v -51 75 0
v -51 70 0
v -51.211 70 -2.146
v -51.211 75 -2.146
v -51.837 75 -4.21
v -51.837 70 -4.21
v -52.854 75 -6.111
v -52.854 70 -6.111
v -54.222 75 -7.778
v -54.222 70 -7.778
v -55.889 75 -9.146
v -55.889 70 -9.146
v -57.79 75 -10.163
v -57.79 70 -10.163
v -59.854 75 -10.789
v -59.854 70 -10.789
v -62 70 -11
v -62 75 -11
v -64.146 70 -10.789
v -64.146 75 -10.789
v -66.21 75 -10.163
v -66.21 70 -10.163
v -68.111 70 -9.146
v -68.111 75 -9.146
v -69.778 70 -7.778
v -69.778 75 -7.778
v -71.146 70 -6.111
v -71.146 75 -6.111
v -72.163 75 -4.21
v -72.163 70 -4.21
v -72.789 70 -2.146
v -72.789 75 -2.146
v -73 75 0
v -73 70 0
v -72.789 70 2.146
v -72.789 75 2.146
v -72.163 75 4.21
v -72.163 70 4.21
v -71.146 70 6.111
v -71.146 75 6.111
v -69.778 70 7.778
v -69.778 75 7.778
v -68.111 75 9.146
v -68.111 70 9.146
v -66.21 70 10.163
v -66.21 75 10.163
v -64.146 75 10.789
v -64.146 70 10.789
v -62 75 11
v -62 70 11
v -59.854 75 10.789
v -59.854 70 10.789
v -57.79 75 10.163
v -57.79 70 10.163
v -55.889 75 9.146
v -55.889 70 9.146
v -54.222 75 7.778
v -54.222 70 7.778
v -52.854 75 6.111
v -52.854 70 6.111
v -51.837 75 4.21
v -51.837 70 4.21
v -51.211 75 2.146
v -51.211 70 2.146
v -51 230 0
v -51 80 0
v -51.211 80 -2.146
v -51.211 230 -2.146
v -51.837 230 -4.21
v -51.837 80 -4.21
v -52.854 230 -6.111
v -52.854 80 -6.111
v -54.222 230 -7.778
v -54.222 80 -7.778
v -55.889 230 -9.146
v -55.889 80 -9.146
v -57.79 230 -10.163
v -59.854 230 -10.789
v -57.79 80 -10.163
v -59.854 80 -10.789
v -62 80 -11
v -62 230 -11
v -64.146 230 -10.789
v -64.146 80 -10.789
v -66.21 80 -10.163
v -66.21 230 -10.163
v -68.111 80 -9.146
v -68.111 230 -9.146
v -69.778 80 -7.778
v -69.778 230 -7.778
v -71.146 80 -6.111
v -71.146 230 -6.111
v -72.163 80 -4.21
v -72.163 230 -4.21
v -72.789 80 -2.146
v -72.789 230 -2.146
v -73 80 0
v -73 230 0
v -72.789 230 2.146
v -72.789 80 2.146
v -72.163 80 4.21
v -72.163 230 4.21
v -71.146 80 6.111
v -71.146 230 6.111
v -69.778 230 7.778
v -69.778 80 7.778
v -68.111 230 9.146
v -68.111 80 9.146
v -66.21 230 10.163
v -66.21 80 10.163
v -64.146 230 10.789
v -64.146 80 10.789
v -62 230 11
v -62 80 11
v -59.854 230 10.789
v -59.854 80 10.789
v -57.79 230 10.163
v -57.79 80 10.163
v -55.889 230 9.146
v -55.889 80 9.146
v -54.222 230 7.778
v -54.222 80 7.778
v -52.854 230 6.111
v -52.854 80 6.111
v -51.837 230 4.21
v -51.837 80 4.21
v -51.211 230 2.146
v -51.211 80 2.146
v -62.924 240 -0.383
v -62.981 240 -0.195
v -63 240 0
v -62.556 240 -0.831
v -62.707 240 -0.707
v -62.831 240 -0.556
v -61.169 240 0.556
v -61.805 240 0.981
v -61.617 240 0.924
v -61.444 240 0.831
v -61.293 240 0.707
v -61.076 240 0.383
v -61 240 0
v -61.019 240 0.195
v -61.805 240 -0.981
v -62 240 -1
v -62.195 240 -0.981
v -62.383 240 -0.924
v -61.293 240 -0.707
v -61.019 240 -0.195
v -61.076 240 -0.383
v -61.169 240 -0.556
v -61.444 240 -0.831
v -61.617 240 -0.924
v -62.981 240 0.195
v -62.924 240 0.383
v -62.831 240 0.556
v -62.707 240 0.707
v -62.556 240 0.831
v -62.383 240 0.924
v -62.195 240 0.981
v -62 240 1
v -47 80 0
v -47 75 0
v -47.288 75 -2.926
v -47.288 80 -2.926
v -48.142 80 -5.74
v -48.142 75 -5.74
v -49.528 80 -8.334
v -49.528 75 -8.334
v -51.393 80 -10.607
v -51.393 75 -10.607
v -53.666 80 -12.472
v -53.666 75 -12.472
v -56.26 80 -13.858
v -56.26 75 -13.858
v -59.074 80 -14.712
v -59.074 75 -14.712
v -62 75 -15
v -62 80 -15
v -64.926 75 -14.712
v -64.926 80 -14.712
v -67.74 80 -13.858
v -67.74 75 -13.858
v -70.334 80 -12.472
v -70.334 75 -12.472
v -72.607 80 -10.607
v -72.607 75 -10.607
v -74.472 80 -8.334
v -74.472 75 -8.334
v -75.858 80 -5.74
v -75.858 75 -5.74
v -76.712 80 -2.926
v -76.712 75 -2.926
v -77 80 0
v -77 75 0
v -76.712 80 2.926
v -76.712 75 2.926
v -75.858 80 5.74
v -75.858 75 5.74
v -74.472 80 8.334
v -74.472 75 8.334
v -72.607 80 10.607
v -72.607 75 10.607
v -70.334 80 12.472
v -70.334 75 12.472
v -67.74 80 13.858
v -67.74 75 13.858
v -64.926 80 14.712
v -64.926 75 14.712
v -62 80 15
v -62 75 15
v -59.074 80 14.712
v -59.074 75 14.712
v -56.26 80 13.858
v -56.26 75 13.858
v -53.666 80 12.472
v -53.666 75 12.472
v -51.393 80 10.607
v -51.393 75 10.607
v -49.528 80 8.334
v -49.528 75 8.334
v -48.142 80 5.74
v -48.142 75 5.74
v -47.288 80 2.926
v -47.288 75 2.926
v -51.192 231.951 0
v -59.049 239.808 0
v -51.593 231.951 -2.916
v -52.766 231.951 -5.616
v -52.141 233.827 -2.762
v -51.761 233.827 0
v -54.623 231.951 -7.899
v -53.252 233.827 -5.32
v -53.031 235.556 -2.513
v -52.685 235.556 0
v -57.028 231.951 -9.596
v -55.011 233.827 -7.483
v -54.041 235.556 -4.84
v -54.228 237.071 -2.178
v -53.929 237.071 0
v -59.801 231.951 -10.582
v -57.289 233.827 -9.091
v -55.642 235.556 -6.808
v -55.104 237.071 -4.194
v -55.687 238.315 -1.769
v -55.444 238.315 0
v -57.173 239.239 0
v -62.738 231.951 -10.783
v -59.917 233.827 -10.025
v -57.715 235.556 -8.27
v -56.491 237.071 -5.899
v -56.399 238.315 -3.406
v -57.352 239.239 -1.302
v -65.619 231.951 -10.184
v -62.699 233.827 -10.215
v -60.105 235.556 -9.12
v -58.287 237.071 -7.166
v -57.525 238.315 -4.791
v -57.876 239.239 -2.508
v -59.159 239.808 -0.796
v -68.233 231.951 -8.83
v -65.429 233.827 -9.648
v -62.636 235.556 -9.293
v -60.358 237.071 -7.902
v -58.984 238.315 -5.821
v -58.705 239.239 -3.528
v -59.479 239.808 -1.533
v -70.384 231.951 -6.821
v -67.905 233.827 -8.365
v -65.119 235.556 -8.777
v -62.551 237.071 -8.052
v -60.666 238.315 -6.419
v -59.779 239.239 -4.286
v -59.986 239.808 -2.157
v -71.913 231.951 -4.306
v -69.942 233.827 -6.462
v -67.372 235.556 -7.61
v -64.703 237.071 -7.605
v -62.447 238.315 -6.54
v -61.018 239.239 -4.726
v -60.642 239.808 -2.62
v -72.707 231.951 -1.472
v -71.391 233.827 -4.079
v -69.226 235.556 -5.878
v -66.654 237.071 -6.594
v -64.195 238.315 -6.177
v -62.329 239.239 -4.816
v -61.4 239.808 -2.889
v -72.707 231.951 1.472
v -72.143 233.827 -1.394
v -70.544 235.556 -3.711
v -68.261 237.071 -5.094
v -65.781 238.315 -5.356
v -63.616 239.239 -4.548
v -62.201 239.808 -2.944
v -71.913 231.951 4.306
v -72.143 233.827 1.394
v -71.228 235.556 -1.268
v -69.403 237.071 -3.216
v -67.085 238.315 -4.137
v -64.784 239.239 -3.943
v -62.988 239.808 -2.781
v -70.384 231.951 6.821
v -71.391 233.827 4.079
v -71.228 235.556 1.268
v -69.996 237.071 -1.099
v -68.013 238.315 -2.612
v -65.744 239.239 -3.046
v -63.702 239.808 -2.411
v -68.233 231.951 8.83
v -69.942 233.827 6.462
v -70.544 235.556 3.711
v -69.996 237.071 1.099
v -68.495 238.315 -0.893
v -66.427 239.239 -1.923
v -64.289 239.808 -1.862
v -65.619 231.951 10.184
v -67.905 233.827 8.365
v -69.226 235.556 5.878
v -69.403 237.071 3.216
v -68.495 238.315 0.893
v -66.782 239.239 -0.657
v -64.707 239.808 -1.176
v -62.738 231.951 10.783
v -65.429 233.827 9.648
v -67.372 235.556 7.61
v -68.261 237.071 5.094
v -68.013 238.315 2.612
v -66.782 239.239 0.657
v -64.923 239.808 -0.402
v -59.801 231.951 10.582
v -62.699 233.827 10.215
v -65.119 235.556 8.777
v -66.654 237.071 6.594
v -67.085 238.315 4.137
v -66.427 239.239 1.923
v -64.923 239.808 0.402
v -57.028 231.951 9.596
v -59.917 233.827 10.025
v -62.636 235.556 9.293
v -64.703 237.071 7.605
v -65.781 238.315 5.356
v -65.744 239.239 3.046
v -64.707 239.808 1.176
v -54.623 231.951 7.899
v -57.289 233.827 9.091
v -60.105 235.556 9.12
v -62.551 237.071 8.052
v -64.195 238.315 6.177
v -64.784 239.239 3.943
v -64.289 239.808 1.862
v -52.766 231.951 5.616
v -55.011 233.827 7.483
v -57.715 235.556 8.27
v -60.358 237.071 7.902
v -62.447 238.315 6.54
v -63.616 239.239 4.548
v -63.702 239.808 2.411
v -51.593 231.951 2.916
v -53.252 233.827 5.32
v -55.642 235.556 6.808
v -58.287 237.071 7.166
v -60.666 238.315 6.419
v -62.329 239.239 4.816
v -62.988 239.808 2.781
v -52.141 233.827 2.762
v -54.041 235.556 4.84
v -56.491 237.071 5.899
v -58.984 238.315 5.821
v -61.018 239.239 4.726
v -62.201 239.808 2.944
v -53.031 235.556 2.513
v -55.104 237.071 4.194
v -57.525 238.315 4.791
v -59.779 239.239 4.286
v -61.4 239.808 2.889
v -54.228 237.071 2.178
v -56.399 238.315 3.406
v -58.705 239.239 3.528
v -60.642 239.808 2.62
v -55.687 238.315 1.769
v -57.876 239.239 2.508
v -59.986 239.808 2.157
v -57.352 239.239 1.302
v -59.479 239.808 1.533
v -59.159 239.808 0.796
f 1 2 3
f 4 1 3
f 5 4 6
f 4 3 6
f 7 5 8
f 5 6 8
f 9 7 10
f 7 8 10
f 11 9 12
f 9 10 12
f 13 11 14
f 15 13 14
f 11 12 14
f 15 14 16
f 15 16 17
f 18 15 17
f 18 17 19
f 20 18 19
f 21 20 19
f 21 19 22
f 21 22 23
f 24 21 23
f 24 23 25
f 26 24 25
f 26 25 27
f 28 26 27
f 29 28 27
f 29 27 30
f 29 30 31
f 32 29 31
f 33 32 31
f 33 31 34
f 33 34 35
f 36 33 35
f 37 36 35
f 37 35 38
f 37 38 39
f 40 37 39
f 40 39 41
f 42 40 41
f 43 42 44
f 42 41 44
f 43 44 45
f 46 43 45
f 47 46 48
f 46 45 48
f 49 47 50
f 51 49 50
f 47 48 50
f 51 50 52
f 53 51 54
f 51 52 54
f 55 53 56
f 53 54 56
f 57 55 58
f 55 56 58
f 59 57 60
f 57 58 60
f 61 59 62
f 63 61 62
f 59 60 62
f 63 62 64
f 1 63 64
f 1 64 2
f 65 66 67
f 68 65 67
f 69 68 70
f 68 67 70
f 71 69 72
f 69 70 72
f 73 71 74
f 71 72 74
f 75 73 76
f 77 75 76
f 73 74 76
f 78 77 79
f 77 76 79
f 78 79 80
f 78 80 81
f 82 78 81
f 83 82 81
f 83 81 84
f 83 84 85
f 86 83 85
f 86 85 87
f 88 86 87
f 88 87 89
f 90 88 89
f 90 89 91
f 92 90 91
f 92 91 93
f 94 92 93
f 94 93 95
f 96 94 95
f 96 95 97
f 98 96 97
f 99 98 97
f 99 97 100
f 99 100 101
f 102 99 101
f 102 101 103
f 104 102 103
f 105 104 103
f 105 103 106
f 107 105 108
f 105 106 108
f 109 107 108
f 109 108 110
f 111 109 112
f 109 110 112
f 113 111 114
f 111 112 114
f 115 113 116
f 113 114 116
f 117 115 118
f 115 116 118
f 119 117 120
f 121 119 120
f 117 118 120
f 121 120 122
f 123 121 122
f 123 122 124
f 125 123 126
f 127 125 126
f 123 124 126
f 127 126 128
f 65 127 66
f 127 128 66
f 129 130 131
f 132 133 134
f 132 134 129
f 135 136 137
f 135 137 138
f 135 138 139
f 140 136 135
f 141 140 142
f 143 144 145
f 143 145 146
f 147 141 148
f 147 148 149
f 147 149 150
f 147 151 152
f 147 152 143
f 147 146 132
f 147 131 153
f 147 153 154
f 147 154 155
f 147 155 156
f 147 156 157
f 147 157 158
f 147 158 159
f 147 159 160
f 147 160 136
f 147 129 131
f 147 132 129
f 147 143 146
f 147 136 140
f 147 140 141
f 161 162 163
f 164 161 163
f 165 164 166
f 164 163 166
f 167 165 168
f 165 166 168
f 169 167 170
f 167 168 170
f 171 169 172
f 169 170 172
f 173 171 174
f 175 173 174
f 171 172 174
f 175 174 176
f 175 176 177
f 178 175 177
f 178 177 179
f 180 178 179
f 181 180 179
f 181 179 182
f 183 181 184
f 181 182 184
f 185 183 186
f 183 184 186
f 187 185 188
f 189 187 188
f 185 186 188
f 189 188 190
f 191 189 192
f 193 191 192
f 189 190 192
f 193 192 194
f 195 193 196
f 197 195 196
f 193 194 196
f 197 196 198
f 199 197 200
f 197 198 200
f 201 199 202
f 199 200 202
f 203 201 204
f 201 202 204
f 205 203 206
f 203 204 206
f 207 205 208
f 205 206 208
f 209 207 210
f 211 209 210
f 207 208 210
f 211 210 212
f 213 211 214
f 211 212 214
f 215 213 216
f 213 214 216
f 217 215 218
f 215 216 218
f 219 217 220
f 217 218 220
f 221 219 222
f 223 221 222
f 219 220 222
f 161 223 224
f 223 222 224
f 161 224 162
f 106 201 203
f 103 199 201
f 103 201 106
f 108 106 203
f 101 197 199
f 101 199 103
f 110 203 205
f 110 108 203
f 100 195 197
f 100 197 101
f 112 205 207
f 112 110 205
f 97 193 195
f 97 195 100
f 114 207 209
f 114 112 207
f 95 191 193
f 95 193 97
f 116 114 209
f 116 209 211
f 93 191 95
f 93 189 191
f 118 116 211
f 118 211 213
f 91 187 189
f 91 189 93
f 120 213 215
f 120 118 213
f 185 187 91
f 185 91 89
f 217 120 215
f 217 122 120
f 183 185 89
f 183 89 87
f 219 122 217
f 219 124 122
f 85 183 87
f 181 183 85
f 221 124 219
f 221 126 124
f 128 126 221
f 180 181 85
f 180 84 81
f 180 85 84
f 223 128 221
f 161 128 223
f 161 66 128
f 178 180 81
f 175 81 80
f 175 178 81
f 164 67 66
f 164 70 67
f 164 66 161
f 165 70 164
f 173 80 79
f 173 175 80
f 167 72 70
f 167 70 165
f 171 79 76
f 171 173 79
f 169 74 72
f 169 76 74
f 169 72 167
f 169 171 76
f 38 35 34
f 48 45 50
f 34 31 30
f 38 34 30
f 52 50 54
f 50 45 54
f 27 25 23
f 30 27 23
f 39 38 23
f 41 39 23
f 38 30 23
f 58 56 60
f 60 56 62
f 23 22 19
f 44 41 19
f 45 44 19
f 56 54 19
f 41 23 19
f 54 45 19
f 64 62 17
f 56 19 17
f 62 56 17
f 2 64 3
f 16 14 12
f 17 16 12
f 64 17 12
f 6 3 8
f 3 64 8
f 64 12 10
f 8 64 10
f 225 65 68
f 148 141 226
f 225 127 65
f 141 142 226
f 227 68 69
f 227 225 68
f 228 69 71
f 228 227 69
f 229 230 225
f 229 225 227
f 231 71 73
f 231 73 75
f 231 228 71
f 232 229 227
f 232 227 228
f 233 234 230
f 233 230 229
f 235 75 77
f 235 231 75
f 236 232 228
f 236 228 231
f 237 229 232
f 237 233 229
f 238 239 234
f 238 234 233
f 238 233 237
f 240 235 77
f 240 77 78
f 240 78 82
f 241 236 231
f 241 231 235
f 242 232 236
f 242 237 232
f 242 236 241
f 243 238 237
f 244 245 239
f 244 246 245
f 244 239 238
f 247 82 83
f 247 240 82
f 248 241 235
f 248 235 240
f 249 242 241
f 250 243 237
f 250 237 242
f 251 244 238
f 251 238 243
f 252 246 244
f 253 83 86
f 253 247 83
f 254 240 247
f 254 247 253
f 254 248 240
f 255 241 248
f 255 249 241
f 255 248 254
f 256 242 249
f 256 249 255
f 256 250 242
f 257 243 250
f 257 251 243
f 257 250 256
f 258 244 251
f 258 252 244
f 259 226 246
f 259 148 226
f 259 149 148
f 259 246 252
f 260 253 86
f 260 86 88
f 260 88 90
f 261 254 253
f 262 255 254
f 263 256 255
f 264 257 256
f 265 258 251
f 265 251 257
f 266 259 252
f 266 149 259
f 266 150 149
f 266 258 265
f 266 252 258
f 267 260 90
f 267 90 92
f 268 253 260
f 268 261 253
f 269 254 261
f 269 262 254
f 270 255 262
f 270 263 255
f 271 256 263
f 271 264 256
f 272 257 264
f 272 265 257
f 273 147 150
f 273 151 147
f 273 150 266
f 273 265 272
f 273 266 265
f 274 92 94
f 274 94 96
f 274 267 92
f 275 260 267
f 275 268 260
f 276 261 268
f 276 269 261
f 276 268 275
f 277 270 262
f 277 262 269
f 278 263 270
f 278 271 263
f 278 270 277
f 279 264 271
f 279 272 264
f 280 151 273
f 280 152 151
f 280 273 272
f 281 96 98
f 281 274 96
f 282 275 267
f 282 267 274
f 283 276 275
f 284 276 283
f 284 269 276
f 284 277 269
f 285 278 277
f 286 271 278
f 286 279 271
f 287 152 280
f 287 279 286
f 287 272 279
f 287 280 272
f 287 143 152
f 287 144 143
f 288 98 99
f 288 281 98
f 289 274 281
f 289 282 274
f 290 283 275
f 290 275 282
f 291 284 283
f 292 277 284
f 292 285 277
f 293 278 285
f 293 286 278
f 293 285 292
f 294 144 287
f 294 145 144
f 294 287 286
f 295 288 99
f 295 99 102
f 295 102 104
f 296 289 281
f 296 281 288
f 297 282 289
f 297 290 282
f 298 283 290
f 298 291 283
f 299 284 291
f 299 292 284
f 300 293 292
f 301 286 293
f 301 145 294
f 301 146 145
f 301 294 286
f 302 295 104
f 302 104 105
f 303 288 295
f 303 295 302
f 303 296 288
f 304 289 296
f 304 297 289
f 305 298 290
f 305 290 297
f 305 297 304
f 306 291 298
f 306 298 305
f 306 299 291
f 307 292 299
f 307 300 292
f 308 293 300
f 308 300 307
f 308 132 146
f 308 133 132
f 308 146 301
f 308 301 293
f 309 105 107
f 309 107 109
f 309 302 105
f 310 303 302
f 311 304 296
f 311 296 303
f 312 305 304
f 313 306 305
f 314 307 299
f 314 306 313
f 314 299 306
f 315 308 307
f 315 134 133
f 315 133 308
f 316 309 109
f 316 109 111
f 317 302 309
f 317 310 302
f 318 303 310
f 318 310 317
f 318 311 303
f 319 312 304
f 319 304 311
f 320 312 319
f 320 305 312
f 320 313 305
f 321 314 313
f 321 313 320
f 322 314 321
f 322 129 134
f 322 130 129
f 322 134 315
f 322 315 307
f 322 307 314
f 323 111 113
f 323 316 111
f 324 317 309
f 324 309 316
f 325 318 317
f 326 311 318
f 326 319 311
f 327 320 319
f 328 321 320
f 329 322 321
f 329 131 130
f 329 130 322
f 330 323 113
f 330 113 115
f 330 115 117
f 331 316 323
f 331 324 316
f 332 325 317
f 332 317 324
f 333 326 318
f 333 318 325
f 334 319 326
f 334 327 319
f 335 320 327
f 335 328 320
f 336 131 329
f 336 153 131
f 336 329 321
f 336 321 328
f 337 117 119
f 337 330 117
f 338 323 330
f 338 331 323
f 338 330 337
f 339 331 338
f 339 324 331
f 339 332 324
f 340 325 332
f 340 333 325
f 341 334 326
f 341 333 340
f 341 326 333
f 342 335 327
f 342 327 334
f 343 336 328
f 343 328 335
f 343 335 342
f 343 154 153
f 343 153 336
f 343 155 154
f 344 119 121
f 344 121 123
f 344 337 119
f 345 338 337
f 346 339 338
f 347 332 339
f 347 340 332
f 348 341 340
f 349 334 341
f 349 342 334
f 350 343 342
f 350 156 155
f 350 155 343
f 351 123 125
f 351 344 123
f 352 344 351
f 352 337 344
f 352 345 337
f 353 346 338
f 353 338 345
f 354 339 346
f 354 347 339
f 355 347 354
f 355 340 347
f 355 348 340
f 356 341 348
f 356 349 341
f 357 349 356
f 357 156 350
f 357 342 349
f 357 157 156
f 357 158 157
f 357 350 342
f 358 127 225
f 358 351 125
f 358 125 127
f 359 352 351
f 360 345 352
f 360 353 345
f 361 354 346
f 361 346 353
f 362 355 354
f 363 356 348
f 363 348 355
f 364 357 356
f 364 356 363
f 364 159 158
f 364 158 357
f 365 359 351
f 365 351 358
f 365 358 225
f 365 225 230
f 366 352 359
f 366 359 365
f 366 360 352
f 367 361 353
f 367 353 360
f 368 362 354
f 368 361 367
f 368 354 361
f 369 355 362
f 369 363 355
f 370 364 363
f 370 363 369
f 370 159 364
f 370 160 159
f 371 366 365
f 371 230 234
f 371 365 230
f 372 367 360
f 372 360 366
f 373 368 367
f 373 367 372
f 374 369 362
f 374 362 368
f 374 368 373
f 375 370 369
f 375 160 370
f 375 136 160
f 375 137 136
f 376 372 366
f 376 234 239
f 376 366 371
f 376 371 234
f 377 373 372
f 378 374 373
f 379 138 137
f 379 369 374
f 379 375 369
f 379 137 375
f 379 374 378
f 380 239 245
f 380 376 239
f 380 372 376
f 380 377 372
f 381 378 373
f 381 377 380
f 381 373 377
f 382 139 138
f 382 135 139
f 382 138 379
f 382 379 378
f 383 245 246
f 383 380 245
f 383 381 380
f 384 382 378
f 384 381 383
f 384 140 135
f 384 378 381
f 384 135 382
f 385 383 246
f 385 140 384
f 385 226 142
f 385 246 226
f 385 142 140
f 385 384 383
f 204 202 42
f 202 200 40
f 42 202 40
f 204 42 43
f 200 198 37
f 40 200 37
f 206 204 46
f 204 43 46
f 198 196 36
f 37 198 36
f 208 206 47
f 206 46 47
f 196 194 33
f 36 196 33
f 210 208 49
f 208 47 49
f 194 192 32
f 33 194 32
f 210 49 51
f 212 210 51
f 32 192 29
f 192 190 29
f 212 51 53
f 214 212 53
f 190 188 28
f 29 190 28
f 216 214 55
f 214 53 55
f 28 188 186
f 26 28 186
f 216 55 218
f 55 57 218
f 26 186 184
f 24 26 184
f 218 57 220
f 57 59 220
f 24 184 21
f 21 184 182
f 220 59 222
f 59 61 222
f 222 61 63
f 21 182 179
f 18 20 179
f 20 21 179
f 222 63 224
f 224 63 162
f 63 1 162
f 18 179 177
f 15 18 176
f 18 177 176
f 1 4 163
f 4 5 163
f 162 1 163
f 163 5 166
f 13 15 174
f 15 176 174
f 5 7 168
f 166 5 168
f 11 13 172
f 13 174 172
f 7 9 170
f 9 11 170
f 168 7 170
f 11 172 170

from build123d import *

# Parameters (mm, degrees)
STOCK_100996468_LAB1B_1_START         = 70
STOCK_100996468_LAB1B_1_OUTLINE_R     = 11
STOCK_100996468_LAB1B_1_DEPTH         = 170
STOCK_100996468_LAB1B_1_START_2       = 75
STOCK_100996468_LAB1B_1_2_OUTLINE_R   = 15
STOCK_100996468_LAB1B_1_2_OUTLINE_R_2 = 11
STOCK_100996468_LAB1B_1_2_DEPTH       = 5
FILLET1_R                             = 10


# Read off the part's stored shape, not the designer's step: Stock-100996468_Lab1B-1
with BuildPart() as part:
    # Stock-100996468_Lab1B-1 outline → Stock-100996468_Lab1B-1 (new body)
    with BuildSketch(Plane(origin=(0, 0, 0), x_dir=(1, 0, 0), z_dir=(0, 1, 0)).offset(STOCK_100996468_LAB1B_1_START)):
        with Locations((-62, 0)):
            Circle(STOCK_100996468_LAB1B_1_OUTLINE_R)
    extrude(amount=STOCK_100996468_LAB1B_1_DEPTH)

    # Stock-100996468_Lab1B-1 2 outline → Stock-100996468_Lab1B-1 2 (add)
    with BuildSketch(Plane(origin=(0, 0, 0), x_dir=(1, 0, 0), z_dir=(0, 1, 0)).offset(STOCK_100996468_LAB1B_1_START_2)):
        with Locations((-62, 0)):
            Circle(STOCK_100996468_LAB1B_1_2_OUTLINE_R)
        with Locations((-62, 0)):
            Circle(STOCK_100996468_LAB1B_1_2_OUTLINE_R_2, mode=Mode.SUBTRACT)
    extrude(amount=STOCK_100996468_LAB1B_1_2_DEPTH)

    # Fillet1
    fillet1_edges = [part.edges().sort_by_distance(p)[0] for p in [
        (-73, 240, 0),
    ]]
    fillet(fillet1_edges, radius=FILLET1_R)


solid = part.part
